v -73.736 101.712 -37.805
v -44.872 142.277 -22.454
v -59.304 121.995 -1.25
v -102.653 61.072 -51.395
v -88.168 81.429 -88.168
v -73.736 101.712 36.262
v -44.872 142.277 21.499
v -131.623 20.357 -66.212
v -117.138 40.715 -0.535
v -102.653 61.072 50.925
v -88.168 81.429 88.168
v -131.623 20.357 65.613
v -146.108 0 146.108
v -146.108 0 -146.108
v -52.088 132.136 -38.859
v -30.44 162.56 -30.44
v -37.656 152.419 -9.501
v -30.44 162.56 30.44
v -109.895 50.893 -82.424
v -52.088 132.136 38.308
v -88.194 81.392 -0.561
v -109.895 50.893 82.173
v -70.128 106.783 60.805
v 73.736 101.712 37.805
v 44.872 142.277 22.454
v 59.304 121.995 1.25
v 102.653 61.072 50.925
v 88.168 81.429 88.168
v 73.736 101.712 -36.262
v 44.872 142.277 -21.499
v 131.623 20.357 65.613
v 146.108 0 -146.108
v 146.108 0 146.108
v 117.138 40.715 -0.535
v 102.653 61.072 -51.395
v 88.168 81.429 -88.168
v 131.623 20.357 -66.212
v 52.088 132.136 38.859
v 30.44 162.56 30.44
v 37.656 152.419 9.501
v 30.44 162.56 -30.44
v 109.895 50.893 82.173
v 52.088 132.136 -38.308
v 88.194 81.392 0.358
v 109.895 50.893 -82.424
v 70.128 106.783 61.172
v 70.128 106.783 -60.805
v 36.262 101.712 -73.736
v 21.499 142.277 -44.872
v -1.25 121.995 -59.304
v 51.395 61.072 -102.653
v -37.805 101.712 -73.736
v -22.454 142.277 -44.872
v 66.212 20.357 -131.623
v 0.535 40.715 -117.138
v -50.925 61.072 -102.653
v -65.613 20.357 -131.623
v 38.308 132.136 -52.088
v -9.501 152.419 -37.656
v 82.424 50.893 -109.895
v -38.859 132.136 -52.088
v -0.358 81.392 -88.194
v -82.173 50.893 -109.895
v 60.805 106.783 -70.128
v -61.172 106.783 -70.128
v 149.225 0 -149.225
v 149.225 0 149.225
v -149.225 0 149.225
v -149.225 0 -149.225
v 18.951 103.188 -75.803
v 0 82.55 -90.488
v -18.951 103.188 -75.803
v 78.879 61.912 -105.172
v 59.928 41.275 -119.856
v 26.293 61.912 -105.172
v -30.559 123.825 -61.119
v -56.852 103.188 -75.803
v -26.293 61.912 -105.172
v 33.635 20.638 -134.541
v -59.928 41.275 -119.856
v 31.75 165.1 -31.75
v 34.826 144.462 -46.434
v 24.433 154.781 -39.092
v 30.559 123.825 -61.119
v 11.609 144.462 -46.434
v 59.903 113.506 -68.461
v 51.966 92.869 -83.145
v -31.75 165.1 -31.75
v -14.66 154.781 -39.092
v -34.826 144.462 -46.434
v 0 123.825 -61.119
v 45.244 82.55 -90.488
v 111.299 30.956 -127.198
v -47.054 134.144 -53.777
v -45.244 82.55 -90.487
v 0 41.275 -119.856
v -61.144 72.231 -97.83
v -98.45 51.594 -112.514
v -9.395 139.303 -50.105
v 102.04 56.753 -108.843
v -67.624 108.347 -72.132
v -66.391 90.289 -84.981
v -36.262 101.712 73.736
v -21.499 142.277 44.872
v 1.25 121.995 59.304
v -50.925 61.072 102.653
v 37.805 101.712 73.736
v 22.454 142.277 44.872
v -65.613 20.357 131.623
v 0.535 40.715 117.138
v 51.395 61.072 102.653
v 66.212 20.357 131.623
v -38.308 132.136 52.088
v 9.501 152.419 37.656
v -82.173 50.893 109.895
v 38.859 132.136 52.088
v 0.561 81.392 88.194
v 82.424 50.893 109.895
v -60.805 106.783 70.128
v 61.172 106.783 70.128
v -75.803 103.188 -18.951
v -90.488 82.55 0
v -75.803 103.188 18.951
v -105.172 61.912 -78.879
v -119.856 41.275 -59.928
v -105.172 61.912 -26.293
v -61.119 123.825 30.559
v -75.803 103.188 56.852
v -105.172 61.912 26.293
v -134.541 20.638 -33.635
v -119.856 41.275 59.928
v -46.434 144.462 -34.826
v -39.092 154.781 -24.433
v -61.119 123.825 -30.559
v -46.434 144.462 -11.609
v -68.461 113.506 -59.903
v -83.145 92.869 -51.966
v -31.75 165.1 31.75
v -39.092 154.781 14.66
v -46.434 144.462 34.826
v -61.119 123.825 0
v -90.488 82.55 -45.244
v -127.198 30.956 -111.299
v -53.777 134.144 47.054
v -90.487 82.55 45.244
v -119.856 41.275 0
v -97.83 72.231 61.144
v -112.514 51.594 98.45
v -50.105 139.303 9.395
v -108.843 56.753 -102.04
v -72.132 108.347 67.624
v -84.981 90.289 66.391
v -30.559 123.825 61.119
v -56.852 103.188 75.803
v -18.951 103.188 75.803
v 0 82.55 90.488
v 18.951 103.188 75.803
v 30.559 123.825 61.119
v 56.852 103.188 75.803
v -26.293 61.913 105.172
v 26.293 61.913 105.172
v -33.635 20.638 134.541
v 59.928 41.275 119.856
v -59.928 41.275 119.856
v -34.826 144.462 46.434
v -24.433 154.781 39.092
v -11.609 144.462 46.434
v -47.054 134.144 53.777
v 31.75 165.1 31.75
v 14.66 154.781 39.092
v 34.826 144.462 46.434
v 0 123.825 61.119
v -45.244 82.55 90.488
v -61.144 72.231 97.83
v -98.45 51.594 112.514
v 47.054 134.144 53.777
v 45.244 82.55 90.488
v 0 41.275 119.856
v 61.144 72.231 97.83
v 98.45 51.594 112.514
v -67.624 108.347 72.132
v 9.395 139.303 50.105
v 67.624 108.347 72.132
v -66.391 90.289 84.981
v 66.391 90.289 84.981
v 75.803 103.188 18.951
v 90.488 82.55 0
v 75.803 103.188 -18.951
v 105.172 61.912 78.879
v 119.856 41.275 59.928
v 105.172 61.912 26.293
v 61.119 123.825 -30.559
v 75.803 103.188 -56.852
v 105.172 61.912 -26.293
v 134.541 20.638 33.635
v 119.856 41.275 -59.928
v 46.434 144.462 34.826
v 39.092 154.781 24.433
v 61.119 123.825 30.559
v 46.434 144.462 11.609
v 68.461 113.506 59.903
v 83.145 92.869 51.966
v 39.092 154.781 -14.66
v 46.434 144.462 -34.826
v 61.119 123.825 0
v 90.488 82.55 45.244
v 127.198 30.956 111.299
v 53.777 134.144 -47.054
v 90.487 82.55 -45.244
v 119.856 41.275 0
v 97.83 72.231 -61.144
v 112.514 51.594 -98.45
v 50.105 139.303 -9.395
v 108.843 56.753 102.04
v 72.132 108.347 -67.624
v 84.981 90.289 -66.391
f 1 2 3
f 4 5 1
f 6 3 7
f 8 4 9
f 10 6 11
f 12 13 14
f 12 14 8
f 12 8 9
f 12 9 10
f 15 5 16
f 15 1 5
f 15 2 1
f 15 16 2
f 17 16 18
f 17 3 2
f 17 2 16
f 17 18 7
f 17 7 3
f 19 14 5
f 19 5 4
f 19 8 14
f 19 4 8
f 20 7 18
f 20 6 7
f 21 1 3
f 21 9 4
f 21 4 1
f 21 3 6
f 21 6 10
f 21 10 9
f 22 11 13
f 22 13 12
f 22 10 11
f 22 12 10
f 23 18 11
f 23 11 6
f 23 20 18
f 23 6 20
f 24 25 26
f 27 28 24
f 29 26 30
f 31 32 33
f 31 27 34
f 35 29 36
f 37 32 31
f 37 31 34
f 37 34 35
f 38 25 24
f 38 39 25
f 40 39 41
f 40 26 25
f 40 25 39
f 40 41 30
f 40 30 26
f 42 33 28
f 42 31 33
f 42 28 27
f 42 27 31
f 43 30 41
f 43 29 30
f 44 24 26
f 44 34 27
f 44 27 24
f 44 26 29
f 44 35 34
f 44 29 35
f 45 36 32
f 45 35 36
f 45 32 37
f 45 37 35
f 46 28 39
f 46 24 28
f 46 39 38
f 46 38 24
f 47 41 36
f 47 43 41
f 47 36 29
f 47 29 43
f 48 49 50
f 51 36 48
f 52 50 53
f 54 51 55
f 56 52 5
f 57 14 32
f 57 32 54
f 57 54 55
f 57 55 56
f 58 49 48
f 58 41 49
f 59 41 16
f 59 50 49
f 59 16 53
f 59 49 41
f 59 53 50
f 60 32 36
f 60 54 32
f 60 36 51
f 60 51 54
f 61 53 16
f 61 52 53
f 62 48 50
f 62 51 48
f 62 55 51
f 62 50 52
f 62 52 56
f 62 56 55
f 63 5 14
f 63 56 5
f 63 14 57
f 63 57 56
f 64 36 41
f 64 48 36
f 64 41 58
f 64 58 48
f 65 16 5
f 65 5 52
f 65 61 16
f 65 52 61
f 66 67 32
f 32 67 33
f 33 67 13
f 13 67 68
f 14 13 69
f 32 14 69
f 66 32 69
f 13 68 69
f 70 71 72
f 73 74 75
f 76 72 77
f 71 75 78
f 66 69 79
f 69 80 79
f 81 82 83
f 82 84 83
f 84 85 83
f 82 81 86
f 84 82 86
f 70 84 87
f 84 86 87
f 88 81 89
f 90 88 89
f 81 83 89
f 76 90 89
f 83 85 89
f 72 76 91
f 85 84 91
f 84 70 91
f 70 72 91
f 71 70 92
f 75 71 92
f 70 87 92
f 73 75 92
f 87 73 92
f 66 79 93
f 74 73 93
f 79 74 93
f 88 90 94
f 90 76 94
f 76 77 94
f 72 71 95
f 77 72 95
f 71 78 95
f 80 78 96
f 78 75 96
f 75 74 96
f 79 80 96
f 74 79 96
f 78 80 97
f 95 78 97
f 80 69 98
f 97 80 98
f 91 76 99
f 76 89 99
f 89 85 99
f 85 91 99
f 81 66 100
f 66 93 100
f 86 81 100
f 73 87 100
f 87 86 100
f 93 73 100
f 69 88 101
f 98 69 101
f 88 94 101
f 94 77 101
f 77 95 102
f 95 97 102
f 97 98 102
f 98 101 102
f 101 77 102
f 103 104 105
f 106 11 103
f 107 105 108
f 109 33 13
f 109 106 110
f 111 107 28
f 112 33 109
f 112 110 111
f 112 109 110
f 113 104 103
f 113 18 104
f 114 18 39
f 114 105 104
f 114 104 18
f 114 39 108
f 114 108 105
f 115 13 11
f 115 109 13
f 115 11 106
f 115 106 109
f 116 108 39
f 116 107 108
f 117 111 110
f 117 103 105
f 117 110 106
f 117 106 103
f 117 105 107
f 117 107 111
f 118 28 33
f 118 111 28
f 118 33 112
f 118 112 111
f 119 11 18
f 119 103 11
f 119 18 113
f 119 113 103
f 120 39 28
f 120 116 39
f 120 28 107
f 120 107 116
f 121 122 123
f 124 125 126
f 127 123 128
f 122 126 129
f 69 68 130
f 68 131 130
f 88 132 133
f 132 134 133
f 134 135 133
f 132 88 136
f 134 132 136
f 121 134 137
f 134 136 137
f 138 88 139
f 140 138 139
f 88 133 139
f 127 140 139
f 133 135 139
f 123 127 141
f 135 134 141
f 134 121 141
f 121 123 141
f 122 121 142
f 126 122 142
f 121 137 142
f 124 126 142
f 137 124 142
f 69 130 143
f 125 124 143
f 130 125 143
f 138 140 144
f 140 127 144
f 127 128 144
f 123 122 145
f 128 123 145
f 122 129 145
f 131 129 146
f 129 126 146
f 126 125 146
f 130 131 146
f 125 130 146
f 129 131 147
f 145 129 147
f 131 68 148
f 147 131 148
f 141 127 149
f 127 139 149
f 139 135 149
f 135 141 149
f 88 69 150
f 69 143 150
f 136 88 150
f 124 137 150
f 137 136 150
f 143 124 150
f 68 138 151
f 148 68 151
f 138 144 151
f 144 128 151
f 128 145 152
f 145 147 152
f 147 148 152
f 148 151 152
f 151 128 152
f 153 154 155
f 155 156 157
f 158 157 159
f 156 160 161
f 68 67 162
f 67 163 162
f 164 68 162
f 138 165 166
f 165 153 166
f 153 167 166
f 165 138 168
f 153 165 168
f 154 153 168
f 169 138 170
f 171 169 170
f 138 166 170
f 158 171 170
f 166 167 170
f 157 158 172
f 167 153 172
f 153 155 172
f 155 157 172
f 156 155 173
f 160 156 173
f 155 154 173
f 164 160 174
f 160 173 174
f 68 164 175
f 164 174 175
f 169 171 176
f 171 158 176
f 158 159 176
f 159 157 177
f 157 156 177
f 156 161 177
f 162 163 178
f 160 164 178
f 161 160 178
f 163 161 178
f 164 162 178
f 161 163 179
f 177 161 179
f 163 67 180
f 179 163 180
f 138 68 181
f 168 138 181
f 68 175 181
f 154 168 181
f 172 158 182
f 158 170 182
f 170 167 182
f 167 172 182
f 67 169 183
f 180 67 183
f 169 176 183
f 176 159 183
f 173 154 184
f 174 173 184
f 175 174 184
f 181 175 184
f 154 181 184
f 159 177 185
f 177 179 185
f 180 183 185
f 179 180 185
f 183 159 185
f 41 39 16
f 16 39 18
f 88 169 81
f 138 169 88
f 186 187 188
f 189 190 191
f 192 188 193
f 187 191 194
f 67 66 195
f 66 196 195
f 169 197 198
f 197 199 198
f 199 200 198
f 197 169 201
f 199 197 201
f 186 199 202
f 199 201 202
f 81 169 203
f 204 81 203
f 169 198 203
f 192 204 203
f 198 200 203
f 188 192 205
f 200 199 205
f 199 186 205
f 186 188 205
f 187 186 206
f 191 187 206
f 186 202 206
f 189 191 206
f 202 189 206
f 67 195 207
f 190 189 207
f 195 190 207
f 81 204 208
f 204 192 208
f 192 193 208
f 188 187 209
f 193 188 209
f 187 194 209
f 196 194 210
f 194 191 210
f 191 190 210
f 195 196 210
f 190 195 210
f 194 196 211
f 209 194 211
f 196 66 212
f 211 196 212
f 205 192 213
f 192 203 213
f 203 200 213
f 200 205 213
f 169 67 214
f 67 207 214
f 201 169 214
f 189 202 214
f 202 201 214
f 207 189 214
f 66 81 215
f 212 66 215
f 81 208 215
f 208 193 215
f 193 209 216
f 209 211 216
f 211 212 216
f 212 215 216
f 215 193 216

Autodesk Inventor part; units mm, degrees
ref_plane "YZ Plane" through (0, 0, 0) normal (1, 0, 0) x (0, 1, 0)
ref_plane "XY Plane" through (0, 0, 0) normal (0, 0, 1) x (1, 0, 0)
sketch "Sketch1" plane through (0, 0, 0) normal (0, 1, 0) x (-1, 0, 0)
  line L0 (-149.225, 149.225) -> (149.225, 149.225)
  line L1 (149.225, 149.225) -> (149.225, -149.225)
  line L2 (149.225, -149.225) -> (-149.225, -149.225)
  line L3 (-149.225, -149.225) -> (-149.225, 149.225)
  line L4 (-149.225, 149.225) -> (149.225, -149.225) construction
  line L5 (149.225, 149.225) -> (-149.225, -149.225) construction
  point P0 (0, 0)
  dimension "d0" = 298.45
  dimension "d1" = 298.45
ref_plane "Work Plane1" through (0, 165.1, 0) normal (0, 1, 0) x (-1, 0, 0)
sketch "Sketch2" plane through (0, 165.1, 0) normal (0, 1, 0) x (-1, 0, 0)
  line L0 (-31.75, 31.75) -> (31.75, 31.75)
  line L1 (31.75, 31.75) -> (31.75, -31.75)
  line L2 (31.75, -31.75) -> (-31.75, -31.75)
  line L3 (-31.75, -31.75) -> (-31.75, 31.75)
  line L4 (-31.75, 31.75) -> (31.75, -31.75) construction
  line L5 (31.75, 31.75) -> (-31.75, -31.75) construction
  point P0 (0, 0)
  dimension "d3" = 63.5
  dimension "d4" = 63.5
loft "Loft1" add profiles "Sketch2", "Sketch1"
shell "Shell1" thickness 2.54 removed faces 1 at (-49.7417, 0, -49.7417)
properties part number "hologram pyramid (for assembly)"
